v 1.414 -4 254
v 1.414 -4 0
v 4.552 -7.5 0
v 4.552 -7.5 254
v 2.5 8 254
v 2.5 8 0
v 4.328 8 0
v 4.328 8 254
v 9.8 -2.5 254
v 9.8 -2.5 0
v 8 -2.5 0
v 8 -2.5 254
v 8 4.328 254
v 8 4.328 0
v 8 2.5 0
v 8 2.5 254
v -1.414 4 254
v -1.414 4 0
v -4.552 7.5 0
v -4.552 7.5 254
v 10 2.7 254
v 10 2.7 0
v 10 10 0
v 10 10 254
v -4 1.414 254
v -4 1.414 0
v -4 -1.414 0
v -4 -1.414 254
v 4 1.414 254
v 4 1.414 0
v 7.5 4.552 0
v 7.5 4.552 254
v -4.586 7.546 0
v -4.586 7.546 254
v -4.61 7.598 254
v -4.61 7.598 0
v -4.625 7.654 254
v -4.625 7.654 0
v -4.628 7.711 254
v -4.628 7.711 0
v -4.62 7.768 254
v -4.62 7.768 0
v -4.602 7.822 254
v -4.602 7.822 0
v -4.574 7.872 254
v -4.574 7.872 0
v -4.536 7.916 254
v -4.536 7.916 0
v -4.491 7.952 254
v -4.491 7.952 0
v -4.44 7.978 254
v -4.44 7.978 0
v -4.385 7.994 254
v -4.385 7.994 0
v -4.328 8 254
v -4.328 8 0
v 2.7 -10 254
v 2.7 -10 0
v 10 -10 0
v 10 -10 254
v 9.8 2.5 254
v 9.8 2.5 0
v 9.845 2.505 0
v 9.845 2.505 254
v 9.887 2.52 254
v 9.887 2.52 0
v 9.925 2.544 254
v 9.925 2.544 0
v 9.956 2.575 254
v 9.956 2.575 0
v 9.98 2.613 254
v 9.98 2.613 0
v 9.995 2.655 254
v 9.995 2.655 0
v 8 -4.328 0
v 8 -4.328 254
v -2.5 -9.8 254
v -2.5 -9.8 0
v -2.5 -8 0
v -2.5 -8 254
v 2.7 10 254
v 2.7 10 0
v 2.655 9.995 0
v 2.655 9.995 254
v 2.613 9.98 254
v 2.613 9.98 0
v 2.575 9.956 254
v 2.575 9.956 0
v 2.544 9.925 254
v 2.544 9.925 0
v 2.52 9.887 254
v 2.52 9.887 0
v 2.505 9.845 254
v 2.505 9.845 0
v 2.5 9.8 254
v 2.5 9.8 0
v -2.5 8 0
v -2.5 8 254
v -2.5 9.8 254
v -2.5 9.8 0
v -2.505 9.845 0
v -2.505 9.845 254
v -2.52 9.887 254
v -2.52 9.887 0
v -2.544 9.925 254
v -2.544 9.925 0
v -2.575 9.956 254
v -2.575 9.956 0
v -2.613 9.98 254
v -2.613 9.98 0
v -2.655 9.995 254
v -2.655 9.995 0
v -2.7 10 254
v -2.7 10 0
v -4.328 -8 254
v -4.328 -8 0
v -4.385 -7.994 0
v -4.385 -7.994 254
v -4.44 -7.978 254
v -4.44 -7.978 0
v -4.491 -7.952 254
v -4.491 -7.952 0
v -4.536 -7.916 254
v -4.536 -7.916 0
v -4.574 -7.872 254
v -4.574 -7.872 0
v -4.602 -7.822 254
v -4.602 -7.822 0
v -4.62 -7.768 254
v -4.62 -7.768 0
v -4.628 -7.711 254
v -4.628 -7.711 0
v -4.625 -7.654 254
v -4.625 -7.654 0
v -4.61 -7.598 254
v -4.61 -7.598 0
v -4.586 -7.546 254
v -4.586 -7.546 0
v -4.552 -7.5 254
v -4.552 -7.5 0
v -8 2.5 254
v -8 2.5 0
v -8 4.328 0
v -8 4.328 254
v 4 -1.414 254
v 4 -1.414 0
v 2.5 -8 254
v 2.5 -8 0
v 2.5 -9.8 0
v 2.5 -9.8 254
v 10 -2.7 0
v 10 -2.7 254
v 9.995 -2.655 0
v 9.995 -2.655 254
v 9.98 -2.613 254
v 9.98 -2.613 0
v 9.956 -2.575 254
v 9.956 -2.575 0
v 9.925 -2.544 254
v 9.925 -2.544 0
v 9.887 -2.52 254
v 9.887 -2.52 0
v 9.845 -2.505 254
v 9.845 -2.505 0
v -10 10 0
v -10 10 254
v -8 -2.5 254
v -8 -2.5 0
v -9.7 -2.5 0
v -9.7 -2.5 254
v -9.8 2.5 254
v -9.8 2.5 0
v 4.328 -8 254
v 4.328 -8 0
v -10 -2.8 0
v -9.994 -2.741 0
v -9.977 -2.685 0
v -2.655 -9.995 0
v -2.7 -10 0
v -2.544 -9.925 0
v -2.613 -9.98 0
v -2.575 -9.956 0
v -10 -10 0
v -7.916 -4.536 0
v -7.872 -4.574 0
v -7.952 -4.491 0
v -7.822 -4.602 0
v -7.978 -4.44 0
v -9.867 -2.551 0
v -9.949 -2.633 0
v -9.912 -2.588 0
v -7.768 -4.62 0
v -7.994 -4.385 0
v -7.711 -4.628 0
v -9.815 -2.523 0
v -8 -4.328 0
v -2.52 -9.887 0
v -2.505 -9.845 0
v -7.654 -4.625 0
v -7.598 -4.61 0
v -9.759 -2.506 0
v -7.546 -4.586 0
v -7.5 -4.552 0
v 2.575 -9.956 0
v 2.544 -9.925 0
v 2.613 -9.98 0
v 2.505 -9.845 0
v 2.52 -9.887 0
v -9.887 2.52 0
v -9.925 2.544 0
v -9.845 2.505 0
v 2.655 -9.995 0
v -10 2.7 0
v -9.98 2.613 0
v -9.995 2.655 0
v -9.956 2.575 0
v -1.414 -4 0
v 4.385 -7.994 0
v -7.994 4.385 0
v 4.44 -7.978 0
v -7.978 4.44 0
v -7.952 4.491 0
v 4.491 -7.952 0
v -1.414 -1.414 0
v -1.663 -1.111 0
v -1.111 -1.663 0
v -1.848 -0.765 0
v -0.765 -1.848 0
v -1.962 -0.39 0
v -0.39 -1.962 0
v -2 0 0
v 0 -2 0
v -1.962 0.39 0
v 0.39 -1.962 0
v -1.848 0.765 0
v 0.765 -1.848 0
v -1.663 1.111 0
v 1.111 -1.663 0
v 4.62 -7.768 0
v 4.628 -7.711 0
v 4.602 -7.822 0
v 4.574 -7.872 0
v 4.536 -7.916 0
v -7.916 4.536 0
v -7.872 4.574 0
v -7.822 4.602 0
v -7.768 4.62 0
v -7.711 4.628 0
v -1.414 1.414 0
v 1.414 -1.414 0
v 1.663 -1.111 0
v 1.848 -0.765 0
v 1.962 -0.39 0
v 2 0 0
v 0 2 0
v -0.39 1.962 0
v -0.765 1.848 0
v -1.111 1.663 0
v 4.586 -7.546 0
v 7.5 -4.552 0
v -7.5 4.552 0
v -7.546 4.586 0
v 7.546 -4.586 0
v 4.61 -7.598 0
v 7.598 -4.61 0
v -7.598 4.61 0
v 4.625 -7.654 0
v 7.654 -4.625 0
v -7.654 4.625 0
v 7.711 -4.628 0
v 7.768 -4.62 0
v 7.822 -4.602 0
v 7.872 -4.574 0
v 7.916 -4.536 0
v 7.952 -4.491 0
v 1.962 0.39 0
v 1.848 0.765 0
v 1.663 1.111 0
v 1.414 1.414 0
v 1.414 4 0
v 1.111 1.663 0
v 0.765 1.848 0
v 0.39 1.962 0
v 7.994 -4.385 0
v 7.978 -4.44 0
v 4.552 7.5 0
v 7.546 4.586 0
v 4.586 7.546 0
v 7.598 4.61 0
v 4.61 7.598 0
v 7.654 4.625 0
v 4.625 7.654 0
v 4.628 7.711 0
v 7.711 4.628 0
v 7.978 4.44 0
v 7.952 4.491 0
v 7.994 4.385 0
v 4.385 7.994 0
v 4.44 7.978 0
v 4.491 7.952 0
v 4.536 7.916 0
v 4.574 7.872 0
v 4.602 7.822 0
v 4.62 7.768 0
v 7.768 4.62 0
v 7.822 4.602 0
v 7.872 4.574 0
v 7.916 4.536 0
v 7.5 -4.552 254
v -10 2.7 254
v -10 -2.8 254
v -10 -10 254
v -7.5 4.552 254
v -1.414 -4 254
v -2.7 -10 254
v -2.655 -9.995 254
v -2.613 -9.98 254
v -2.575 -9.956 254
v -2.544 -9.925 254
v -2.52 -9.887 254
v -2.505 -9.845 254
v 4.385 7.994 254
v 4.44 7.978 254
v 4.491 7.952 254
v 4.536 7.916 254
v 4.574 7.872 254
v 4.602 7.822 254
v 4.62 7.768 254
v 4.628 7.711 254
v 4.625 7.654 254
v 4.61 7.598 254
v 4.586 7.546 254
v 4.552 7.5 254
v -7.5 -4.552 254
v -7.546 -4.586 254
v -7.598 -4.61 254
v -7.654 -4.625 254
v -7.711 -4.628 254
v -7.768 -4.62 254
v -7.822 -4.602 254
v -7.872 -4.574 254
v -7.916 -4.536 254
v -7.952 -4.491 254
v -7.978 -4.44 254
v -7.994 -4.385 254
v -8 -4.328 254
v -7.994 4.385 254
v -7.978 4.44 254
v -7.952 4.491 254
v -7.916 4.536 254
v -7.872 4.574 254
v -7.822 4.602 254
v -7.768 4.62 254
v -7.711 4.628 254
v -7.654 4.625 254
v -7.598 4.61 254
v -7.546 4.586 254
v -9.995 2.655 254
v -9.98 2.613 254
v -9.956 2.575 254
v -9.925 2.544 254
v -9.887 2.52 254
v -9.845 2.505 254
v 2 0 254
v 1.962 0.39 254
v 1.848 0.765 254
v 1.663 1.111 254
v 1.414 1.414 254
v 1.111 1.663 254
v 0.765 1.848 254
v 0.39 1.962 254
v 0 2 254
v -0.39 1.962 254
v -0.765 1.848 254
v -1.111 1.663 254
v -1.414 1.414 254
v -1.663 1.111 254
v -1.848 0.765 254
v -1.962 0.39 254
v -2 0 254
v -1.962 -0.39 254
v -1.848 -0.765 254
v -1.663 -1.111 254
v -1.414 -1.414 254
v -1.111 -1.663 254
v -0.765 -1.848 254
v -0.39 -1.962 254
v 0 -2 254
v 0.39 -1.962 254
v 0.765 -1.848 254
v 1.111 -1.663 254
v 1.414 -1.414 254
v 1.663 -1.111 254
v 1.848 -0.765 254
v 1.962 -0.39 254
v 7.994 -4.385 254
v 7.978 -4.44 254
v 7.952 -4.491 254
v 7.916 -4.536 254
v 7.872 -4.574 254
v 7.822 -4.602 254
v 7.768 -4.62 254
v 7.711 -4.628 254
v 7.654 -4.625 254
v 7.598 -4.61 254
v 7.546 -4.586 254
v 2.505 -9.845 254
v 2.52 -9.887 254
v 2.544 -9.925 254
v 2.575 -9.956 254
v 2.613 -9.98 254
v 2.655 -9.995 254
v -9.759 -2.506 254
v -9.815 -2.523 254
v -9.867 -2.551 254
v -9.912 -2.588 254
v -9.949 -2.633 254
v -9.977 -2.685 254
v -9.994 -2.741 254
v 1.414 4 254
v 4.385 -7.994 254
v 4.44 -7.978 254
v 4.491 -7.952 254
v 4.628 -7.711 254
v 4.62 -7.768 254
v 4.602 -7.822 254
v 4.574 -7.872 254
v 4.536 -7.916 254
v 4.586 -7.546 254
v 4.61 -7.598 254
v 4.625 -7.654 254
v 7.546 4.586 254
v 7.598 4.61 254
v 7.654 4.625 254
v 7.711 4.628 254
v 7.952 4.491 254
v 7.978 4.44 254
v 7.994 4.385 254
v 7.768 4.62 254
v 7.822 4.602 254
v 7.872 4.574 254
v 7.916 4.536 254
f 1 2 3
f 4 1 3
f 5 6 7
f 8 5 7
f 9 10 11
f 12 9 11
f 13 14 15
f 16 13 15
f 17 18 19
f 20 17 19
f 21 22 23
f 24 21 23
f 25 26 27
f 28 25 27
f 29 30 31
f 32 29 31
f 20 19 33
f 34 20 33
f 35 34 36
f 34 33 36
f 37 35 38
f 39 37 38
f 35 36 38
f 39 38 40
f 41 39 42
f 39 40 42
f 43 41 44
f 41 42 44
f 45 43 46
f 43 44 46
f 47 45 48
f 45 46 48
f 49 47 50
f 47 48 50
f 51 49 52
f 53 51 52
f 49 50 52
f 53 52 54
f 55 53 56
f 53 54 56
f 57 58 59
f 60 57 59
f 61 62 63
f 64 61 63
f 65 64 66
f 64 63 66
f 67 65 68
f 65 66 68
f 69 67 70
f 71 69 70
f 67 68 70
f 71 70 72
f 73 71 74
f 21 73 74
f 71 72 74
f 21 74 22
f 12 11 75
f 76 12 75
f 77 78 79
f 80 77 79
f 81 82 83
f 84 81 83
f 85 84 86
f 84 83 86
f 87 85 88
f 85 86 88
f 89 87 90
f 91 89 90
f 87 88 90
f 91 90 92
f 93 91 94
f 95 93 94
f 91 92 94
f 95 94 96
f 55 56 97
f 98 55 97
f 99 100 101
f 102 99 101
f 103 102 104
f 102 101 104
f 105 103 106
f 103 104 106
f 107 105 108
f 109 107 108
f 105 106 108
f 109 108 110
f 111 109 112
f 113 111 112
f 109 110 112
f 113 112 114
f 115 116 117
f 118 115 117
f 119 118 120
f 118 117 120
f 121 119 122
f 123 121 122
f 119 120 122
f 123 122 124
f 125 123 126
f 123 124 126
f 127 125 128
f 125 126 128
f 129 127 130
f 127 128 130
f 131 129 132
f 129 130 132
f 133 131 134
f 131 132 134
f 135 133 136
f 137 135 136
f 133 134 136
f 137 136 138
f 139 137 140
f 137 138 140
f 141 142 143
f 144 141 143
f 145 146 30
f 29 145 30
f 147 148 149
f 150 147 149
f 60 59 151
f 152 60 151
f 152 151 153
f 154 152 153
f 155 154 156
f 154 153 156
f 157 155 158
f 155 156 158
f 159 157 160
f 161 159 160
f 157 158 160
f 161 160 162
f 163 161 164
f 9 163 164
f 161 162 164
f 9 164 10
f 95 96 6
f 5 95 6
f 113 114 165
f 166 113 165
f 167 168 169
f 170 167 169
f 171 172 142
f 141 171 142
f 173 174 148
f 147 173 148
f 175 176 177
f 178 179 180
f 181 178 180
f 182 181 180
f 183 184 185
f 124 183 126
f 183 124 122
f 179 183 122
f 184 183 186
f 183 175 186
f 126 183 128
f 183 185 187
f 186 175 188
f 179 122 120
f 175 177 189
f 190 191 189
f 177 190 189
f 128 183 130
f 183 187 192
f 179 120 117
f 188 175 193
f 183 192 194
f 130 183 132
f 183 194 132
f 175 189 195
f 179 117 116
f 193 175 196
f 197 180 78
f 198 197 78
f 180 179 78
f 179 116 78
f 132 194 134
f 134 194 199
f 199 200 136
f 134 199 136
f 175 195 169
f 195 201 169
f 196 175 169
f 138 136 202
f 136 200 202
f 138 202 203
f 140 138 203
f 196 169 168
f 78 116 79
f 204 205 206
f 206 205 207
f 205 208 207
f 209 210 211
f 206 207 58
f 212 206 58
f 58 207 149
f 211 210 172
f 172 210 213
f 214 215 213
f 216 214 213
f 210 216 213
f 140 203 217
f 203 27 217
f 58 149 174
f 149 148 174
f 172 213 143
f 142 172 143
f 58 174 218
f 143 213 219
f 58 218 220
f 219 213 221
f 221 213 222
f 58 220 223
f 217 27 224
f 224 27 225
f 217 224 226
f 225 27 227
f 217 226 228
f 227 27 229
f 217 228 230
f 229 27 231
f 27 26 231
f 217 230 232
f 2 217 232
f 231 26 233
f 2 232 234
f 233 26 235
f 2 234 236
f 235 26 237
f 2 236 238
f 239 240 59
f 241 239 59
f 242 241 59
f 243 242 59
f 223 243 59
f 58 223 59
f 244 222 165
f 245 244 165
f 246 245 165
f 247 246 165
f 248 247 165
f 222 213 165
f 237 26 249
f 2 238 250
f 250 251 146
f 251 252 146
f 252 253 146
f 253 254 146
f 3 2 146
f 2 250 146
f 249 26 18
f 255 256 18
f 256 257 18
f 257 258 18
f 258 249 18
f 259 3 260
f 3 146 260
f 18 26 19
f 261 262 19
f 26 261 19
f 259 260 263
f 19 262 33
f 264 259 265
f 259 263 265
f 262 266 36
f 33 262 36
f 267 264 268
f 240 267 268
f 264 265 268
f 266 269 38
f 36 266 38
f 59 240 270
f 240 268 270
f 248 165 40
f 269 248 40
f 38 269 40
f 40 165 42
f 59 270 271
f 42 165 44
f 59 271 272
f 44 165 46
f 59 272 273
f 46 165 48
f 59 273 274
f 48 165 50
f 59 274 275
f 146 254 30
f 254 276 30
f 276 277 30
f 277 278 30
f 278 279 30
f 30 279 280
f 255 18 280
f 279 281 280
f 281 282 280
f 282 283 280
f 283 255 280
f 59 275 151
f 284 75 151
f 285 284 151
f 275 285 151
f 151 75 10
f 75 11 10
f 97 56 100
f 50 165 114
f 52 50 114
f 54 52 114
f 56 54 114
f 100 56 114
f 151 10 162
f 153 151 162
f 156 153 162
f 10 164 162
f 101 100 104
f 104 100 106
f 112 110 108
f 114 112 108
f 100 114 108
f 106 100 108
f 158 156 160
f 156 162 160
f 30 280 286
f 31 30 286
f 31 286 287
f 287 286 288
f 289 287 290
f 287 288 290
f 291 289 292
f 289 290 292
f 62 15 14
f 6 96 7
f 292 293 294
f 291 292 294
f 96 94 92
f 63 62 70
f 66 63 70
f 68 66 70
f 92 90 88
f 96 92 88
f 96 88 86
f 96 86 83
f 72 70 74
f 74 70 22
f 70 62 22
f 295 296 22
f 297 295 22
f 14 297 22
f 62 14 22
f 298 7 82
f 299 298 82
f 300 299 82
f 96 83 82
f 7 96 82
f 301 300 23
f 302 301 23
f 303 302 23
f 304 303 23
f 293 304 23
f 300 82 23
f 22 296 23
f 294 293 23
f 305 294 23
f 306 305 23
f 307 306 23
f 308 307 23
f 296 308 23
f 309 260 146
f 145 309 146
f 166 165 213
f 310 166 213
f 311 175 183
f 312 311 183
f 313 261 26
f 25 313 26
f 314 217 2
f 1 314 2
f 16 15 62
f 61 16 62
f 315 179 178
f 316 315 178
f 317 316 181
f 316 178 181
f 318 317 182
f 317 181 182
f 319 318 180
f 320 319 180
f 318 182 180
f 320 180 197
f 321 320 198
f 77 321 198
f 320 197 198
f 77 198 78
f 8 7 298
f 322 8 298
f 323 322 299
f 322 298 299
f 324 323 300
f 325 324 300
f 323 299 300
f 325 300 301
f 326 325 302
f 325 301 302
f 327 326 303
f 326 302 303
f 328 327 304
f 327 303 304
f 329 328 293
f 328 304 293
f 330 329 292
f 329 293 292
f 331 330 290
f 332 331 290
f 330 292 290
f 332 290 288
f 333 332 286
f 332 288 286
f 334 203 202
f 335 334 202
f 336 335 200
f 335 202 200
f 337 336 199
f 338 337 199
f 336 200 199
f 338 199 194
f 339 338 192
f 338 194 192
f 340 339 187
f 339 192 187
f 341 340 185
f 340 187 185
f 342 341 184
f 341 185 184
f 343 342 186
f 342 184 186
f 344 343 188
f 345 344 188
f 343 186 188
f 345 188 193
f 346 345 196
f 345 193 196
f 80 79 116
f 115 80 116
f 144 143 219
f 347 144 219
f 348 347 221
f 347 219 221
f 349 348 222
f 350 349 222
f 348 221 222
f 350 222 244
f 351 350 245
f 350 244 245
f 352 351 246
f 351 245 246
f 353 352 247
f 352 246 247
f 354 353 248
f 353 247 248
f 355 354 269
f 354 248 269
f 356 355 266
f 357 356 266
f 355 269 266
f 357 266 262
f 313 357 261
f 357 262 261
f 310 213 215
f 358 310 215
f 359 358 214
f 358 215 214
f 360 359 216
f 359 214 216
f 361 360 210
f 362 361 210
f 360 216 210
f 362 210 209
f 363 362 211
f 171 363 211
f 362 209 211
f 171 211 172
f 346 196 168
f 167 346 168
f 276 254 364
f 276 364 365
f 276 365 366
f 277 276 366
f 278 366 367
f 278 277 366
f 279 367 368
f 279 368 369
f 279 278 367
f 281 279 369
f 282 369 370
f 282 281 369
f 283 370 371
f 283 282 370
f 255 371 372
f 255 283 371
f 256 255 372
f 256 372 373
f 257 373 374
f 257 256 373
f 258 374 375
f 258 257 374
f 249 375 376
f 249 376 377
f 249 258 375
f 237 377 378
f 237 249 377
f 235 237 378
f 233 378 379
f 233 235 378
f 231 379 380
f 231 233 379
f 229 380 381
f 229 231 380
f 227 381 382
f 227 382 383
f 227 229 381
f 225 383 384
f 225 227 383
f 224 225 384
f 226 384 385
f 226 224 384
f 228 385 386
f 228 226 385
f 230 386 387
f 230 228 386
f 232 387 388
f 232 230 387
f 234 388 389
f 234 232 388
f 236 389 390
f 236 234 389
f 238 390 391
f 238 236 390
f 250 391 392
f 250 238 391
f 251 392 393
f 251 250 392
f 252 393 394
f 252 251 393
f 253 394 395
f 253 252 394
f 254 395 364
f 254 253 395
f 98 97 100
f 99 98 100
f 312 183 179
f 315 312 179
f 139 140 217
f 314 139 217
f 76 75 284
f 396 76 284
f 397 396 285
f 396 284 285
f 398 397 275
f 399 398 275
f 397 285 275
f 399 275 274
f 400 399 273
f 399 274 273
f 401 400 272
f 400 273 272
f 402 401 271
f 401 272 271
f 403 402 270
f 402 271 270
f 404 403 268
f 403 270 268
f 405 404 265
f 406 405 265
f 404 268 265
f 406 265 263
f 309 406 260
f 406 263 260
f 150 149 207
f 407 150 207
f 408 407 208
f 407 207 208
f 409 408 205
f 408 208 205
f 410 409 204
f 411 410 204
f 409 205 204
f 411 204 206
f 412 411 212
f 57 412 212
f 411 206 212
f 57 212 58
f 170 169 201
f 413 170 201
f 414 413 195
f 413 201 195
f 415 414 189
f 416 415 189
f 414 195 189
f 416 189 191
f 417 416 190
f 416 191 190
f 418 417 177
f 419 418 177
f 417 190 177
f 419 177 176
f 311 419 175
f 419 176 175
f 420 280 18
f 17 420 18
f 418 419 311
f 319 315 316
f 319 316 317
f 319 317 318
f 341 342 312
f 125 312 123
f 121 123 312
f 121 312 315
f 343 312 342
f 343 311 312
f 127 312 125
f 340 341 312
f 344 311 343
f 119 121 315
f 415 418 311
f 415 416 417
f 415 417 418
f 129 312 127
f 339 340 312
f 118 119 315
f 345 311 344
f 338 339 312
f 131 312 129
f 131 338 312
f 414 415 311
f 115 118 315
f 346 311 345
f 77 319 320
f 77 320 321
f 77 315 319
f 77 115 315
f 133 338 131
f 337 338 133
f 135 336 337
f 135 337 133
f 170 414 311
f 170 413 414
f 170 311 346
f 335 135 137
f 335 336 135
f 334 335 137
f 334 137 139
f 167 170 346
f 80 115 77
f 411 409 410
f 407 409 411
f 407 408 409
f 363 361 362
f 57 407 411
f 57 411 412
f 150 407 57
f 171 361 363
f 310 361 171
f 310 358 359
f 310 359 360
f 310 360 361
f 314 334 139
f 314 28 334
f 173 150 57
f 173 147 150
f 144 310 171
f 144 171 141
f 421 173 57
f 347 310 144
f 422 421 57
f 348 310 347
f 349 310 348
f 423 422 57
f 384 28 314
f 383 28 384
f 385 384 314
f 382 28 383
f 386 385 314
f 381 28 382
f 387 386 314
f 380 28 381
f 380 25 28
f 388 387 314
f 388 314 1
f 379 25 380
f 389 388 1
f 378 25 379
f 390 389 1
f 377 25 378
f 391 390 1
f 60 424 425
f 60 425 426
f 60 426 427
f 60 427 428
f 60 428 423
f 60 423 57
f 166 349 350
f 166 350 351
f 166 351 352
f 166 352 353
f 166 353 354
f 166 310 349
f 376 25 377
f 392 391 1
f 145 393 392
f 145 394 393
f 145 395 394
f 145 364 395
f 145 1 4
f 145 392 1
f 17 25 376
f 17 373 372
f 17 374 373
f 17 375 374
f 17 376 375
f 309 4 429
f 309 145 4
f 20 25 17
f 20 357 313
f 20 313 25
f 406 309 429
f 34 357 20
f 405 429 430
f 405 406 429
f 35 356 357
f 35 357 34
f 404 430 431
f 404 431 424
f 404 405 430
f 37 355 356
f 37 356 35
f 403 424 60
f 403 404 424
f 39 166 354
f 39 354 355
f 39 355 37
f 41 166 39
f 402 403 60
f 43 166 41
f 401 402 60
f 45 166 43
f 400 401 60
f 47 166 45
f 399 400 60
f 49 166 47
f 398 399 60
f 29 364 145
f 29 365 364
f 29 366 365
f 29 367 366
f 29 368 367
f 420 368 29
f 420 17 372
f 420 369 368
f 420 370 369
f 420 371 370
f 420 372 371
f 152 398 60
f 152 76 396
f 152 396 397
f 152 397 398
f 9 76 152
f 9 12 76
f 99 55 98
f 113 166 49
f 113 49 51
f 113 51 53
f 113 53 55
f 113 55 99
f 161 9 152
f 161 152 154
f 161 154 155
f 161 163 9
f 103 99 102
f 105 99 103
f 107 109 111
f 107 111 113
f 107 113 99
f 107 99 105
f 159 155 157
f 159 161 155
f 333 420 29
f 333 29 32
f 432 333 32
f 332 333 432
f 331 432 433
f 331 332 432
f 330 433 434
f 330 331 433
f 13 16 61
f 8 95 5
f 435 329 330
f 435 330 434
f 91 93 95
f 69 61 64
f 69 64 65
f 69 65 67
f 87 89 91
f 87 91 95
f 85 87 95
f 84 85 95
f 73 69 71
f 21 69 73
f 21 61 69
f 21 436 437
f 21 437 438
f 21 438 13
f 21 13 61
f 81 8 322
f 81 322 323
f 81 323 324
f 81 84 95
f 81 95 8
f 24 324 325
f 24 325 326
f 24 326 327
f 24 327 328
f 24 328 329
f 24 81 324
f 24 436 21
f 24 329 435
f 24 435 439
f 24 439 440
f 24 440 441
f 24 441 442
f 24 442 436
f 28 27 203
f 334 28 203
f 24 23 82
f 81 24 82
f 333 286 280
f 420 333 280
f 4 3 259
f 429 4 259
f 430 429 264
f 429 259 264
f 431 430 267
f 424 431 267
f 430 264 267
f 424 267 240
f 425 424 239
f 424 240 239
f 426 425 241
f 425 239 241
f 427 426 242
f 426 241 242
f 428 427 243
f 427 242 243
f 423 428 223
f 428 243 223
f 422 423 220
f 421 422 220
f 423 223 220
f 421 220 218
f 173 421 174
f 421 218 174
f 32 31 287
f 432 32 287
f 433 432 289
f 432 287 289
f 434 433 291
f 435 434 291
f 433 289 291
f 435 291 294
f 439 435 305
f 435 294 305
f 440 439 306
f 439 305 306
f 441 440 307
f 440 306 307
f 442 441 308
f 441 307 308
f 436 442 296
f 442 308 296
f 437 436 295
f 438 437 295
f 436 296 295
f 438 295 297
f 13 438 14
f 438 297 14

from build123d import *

# Parameters (mm, degrees)
F0_R     = 2
F1_DEPTH = 254


with BuildPart() as f1:
    # F0 (on Top) → F1 (new body)
    with BuildSketch(Plane.XY):
        with BuildLine():
            Line((10, 2.7), (10, 10))
            Line((10, 10), (2.7, 10))
            ThreePointArc((2.7, 10), (2.558579, 9.941421), (2.5, 9.8))
            Line((2.5, 9.8), (2.5, 8))
            Line((2.5, 8), (4.32817, 8))
            ThreePointArc((4.32817, 8), (4.6021, 7.822321), (4.551552, 7.49975))
            Line((4.551552, 7.49975), (1.414214, 4))
            Line((1.414214, 4), (-1.414214, 4))
            Line((-1.414214, 4), (-4.551552, 7.49975))
            ThreePointArc((-4.551552, 7.49975), (-4.6021, 7.822321), (-4.32817, 8))
            Line((-4.32817, 8), (-2.5, 8))
            Line((-2.5, 8), (-2.5, 9.8))
            ThreePointArc((-2.5, 9.8), (-2.558579, 9.941421), (-2.7, 10))
            Line((-2.7, 10), (-10, 10))
            Line((-10, 10), (-10, 2.7))
            ThreePointArc((-10, 2.7), (-9.941421, 2.558579), (-9.8, 2.5))
            Line((-9.8, 2.5), (-8, 2.5))
            Line((-8, 2.5), (-8, 4.32817))
            ThreePointArc((-8, 4.32817), (-7.822321, 4.6021), (-7.49975, 4.551552))
            Line((-7.49975, 4.551552), (-4, 1.414214))
            Line((-4, 1.414214), (-4, -1.414214))
            Line((-4, -1.414214), (-7.49975, -4.551552))
            ThreePointArc((-7.49975, -4.551552), (-7.822321, -4.6021), (-8, -4.32817))
            Line((-8, -4.32817), (-8, -2.5))
            Line((-8, -2.5), (-9.7, -2.5))
            ThreePointArc((-9.7, -2.5), (-9.912132, -2.587868), (-10, -2.8))
            Line((-10, -2.8), (-10, -10))
            Line((-10, -10), (-2.7, -10))
            ThreePointArc((-2.7, -10), (-2.558579, -9.941421), (-2.5, -9.8))
            Line((-2.5, -9.8), (-2.5, -8))
            Line((-2.5, -8), (-4.32817, -8))
            ThreePointArc((-4.32817, -8), (-4.6021, -7.822321), (-4.551552, -7.49975))
            Line((-4.551552, -7.49975), (-1.414214, -4))
            Line((-1.414214, -4), (1.414214, -4))
            Line((1.414214, -4), (4.551552, -7.49975))
            ThreePointArc((4.551552, -7.49975), (4.6021, -7.822321), (4.32817, -8))
            Line((4.32817, -8), (2.5, -8))
            Line((2.5, -8), (2.5, -9.8))
            ThreePointArc((2.5, -9.8), (2.558579, -9.941421), (2.7, -10))
            Line((2.7, -10), (10, -10))
            Line((10, -10), (10, -2.7))
            ThreePointArc((10, -2.7), (9.941421, -2.558579), (9.8, -2.5))
            Line((9.8, -2.5), (8, -2.5))
            Line((8, -2.5), (8, -4.32817))
            ThreePointArc((8, -4.32817), (7.822321, -4.6021), (7.49975, -4.551552))
            Line((7.49975, -4.551552), (4, -1.414214))
            Line((4, -1.414214), (4, 1.414214))
            Line((4, 1.414214), (7.49975, 4.551552))
            ThreePointArc((7.49975, 4.551552), (7.822321, 4.6021), (8, 4.32817))
            Line((8, 4.32817), (8, 2.5))
            Line((8, 2.5), (9.8, 2.5))
            ThreePointArc((9.8, 2.5), (9.941421, 2.558579), (10, 2.7))
        make_face()
        Circle(F0_R, mode=Mode.SUBTRACT)
    extrude(amount=F1_DEPTH)


solid = f1.part
